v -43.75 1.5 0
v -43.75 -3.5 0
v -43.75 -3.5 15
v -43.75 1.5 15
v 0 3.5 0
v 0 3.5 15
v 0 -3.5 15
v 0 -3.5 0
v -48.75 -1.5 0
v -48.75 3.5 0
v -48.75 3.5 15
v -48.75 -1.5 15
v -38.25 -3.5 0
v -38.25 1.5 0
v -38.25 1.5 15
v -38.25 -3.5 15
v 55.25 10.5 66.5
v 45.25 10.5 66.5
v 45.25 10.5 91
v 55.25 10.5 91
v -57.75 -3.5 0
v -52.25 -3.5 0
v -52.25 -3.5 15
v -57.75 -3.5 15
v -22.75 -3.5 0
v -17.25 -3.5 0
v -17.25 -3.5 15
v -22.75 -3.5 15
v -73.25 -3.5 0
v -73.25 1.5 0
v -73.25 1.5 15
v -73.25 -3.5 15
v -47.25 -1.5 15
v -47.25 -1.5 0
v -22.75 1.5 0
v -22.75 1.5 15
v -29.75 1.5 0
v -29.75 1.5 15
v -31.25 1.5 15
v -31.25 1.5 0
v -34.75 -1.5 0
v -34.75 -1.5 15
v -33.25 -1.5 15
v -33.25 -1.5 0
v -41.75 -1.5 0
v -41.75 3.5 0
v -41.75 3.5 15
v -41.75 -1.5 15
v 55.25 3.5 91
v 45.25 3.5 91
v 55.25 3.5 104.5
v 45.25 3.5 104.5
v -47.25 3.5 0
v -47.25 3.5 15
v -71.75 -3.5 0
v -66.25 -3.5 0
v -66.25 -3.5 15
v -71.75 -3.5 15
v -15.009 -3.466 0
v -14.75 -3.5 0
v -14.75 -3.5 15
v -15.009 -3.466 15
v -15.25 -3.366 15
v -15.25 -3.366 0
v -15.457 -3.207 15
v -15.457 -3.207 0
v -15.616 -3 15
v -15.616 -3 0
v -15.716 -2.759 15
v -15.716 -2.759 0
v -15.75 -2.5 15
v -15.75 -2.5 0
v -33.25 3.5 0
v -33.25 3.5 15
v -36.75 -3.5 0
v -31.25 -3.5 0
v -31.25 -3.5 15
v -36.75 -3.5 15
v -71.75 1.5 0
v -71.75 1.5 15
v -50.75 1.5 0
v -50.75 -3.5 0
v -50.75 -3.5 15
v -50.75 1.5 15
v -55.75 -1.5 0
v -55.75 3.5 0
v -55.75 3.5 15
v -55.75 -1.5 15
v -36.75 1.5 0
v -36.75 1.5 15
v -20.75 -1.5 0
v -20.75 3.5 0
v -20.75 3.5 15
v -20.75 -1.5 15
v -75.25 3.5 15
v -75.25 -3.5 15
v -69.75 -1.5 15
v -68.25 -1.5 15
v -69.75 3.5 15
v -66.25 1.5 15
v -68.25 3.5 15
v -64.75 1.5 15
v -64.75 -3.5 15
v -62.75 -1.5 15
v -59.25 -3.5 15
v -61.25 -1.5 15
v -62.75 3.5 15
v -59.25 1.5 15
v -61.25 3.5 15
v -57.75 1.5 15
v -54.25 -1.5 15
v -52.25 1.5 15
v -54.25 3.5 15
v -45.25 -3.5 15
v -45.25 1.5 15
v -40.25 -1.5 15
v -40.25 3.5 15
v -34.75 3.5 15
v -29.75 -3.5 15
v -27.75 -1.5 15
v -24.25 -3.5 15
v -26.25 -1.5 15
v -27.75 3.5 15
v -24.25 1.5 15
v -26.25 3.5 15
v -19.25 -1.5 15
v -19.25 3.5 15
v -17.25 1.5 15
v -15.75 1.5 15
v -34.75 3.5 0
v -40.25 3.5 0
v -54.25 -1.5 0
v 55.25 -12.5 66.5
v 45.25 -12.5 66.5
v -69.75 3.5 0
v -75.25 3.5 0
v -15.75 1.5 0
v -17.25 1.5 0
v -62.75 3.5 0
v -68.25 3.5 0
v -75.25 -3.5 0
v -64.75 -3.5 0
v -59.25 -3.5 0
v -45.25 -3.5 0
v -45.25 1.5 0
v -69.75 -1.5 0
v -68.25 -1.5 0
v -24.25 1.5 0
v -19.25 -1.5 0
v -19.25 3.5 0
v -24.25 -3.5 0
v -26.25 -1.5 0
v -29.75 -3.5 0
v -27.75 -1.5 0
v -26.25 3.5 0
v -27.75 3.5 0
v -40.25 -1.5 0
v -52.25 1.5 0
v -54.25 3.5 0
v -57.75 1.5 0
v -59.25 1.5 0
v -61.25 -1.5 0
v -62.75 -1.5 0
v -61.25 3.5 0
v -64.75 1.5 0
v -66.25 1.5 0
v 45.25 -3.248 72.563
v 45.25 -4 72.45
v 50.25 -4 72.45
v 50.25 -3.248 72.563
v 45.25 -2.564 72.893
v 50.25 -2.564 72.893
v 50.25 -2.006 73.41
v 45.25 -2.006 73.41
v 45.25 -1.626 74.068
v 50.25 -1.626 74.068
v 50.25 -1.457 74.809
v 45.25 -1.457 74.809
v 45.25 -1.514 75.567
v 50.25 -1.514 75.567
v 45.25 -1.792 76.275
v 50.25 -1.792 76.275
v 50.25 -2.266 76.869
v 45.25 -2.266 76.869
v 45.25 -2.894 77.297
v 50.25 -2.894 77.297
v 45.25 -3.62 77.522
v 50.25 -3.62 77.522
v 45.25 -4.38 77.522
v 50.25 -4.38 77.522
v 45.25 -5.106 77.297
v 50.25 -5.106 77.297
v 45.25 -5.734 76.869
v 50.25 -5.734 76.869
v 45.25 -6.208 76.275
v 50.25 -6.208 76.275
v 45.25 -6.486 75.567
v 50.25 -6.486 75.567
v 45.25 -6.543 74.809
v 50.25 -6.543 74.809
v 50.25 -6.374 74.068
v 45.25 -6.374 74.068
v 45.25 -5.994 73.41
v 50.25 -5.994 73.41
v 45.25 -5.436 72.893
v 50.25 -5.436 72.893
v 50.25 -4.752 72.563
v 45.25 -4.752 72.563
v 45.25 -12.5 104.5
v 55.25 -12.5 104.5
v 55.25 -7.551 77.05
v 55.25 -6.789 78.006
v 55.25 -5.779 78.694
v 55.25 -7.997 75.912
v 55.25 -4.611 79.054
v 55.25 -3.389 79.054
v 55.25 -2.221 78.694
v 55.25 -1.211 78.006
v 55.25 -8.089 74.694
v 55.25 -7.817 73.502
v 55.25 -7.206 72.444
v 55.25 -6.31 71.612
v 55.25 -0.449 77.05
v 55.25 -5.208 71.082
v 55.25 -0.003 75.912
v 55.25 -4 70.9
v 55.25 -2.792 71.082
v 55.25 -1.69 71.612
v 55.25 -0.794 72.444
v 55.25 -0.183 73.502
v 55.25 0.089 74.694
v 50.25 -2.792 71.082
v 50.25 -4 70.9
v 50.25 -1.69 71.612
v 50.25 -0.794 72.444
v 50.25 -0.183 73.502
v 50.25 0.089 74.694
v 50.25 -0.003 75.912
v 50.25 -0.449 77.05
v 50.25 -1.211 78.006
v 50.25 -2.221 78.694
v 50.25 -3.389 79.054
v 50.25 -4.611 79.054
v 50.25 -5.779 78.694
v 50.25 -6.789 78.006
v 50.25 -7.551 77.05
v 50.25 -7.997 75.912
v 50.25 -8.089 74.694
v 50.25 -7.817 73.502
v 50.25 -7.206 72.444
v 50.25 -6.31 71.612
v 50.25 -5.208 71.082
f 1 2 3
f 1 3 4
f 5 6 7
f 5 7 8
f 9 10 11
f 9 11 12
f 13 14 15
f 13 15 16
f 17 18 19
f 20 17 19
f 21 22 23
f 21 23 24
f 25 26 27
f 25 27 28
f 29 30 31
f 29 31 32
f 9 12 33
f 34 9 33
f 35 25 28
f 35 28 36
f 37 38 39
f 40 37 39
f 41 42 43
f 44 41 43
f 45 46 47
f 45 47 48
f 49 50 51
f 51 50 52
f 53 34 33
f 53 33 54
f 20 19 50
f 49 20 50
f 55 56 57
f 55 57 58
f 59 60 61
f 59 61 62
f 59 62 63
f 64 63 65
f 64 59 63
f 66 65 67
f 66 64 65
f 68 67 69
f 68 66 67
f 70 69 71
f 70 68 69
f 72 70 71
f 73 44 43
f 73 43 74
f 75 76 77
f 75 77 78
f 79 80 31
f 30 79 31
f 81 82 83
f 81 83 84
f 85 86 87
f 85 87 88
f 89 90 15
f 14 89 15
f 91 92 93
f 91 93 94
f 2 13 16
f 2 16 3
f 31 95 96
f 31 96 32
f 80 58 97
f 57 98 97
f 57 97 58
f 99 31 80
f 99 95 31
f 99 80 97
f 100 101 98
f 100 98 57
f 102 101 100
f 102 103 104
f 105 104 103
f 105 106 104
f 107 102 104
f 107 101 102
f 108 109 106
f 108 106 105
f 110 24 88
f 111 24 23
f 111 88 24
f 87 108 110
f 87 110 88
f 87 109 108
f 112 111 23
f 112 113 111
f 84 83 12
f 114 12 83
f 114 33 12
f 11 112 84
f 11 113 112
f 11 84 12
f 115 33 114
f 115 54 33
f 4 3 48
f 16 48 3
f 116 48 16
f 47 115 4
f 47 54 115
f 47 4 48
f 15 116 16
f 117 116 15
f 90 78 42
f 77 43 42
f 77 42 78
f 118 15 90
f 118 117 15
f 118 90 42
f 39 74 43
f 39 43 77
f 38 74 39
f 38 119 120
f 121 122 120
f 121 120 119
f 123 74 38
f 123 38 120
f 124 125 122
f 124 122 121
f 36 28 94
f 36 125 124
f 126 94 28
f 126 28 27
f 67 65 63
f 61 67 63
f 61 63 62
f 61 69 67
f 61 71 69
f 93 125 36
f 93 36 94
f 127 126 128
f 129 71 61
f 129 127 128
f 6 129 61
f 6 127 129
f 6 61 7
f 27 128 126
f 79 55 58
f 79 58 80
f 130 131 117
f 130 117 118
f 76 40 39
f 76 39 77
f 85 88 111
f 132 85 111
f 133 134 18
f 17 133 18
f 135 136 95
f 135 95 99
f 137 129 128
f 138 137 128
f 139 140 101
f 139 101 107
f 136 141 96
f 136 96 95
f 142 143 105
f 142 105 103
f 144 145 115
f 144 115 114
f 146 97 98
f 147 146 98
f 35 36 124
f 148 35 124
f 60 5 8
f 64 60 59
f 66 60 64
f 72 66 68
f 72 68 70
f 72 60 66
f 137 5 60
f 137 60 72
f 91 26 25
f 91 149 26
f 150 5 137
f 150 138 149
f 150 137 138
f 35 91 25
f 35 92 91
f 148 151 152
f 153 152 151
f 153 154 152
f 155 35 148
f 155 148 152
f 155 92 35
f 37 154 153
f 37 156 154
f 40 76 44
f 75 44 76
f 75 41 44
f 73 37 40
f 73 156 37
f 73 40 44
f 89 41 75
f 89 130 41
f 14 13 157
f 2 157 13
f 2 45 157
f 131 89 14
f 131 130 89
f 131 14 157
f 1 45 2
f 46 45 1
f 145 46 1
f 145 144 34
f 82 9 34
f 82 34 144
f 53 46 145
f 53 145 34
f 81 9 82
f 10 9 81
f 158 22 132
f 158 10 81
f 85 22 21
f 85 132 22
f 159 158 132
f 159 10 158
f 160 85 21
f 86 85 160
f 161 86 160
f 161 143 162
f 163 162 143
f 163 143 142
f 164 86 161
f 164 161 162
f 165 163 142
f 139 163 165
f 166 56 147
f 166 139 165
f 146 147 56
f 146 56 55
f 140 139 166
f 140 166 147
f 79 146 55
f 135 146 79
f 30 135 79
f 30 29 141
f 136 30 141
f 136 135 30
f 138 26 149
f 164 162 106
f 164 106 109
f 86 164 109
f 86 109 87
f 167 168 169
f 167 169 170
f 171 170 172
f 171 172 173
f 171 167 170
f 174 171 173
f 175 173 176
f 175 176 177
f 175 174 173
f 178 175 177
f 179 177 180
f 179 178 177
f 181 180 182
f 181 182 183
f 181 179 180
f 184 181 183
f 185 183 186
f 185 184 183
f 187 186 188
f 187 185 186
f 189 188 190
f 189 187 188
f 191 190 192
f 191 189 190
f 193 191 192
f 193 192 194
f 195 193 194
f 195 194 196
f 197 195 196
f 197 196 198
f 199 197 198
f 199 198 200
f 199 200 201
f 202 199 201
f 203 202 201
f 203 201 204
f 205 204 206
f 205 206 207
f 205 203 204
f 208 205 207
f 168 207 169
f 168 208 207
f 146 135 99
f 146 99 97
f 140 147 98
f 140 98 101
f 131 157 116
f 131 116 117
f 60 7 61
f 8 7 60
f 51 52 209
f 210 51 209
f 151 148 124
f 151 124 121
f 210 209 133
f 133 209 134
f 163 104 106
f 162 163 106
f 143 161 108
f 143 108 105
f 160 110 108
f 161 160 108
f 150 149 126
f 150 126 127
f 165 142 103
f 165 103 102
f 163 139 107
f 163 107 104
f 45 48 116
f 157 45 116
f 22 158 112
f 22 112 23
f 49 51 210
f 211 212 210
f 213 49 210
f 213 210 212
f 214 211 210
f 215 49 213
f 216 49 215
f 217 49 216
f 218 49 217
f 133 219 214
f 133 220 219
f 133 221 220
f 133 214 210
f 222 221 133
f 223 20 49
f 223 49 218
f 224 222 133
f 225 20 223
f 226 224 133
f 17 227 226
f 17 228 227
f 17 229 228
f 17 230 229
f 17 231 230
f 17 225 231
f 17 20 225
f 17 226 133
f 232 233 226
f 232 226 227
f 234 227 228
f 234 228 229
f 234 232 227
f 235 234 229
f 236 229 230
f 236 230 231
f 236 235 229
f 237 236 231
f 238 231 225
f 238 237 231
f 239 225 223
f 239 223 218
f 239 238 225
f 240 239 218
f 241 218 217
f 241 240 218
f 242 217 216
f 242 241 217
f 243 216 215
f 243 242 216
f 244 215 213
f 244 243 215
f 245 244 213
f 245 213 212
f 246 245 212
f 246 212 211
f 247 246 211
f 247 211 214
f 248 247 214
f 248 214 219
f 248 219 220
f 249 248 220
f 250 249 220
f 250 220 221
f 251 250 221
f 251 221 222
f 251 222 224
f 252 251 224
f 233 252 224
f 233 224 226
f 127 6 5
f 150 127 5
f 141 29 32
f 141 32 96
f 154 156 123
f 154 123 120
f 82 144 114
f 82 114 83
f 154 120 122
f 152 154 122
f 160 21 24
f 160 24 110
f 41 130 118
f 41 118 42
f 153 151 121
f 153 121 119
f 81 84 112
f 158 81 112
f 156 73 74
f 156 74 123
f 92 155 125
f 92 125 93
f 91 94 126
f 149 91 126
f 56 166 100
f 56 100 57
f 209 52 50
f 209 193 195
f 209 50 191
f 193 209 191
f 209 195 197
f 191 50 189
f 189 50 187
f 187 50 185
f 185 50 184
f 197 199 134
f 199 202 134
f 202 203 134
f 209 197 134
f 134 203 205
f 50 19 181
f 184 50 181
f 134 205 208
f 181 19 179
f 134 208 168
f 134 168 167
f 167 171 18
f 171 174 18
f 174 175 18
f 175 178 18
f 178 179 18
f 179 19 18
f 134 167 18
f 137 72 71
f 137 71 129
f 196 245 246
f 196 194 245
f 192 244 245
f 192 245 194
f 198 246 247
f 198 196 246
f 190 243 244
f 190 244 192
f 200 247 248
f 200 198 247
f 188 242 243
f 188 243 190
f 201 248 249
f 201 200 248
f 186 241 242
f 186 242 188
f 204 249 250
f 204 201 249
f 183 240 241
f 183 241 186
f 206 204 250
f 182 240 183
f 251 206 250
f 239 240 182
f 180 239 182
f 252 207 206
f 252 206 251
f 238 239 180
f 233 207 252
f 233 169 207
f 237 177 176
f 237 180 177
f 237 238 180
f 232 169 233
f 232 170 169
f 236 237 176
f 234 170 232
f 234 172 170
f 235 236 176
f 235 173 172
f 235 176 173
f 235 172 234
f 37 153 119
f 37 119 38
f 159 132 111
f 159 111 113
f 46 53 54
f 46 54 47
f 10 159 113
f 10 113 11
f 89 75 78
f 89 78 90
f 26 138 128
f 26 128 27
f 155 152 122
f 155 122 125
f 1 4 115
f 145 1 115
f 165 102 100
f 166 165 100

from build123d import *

# Parameters (mm, degrees)
BOSS_EXTRUDE1_DEPTH = 62.5
SKETCH2_W           = 31.5
SKETCH2_H           = 7
BOSS_EXTRUDE2_DEPTH = 20
SKETCH3_W           = 15
SKETCH3_H           = 7
BOSS_EXTRUDE3_DEPTH = 19
SKETCH4_W           = 15
SKETCH4_H           = 15
BOSS_EXTRUDE4_DEPTH = 10
SKETCH5_R           = 3.71375
CUT_EXTRUDE1_DEPTH  = 7
FILLET1_R           = 1
FILLET2_R           = 1
SKETCH7_R           = 4.1
BOSS_EXTRUDE5_DEPTH = 10
SKETCH7_3_R         = 4.1
SKETCH7_3_R_2       = 2.55
BOSS_EXTRUDE6_DEPTH = 5
SKETCH8_W           = 8
SKETCH8_H           = 50
BOSS_EXTRUDE7_DEPTH = 7
SKETCH9_W           = 3
SKETCH9_H           = 40
CUT_EXTRUDE2_DEPTH  = 10
CUT_EXTRUDE3_DEPTH  = 134.333463542


with BuildPart() as part:
    # Sketch1 → Boss-Extrude1 (new body)
    with BuildSketch(Plane.XY):
        Polygon((13.75, -3.5), (-13.75, -3.5), (-15.75, -3.5), (-15.75, 1.5), (-17.25, 1.5), (-17.25, -3.5), (-22.75, -3.5), (-22.75, 1.5), (-24.25, 1.5), (-24.25, -3.5), (-29.75, -3.5), (-29.75, 1.5), (-31.25, 1.5), (-31.25, -3.5), (-36.75, -3.5), (-36.75, 1.5), (-38.25, 1.5), (-38.25, -3.5), (-43.75, -3.5), (-43.75, 1.5), (-45.25, 1.5), (-45.25, -3.5), (-50.75, -3.5), (-50.75, 1.5), (-52.25, 1.5), (-52.25, -3.5), (-57.75, -3.5), (-57.75, 1.5), (-59.25, 1.5), (-59.25, -3.5), (-64.75, -3.5), (-64.75, 1.5), (-66.25, 1.5), (-66.25, -3.5), (-71.75, -3.5), (-71.75, 1.5), (-73.25, 1.5), (-73.25, -3.5), (-75.25, -3.5), (-75.25, 3.5), (-69.75, 3.5), (-69.75, -1.5), (-68.25, -1.5), (-68.25, 3.5), (-62.75, 3.5), (-62.75, -1.5), (-61.25, -1.5), (-61.25, 3.5), (-55.75, 3.5), (-55.75, -1.5), (-54.25, -1.5), (-54.25, 3.5), (-48.75, 3.5), (-48.75, -1.5), (-47.25, -1.5), (-47.25, 3.5), (-41.75, 3.5), (-41.75, -1.5), (-40.25, -1.5), (-40.25, 3.5), (-34.75, 3.5), (-34.75, -1.5), (-33.25, -1.5), (-33.25, 3.5), (-27.75, 3.5), (-27.75, -1.5), (-26.25, -1.5), (-26.25, 3.5), (-20.75, 3.5), (-20.75, -1.5), (-19.25, -1.5), (-19.25, 3.5), (-13.75, 3.5), (13.75, 3.5), (19.25, 3.5), (19.25, -1.5), (20.75, -1.5), (20.75, 3.5), (26.25, 3.5), (26.25, -1.5), (27.75, -1.5), (27.75, 3.5), (33.25, 3.5), (33.25, -1.5), (34.75, -1.5), (34.75, 3.5), (40.25, 3.5), (40.25, -1.5), (41.75, -1.5), (41.75, 3.5), (47.25, 3.5), (47.25, -1.5), (48.75, -1.5), (48.75, 3.5), (54.25, 3.5), (54.25, -1.5), (55.75, -1.5), (55.75, 3.5), (61.25, 3.5), (61.25, -1.5), (62.75, -1.5), (62.75, 3.5), (68.25, 3.5), (68.25, -1.5), (69.75, -1.5), (69.75, 3.5), (75.25, 3.5), (75.25, -3.5), (73.25, -3.5), (73.25, 1.5), (71.75, 1.5), (71.75, -3.5), (66.25, -3.5), (66.25, 1.5), (64.75, 1.5), (64.75, -3.5), (59.25, -3.5), (59.25, 1.5), (57.75, 1.5), (57.75, -3.5), (52.25, -3.5), (52.25, 1.5), (50.75, 1.5), (50.75, -3.5), (45.25, -3.5), (45.25, 1.5), (43.75, 1.5), (43.75, -3.5), (38.25, -3.5), (38.25, 1.5), (36.75, 1.5), (36.75, -3.5), (31.25, -3.5), (31.25, 1.5), (29.75, 1.5), (29.75, -3.5), (24.25, -3.5), (24.25, 1.5), (22.75, 1.5), (22.75, -3.5), (17.25, -3.5), (17.25, 1.5), (15.75, 1.5), (15.75, -3.5), align=None)
    extrude(amount=BOSS_EXTRUDE1_DEPTH)

    # Sketch2 → Boss-Extrude2 (add)
    with BuildSketch(Plane.XY.offset(62.5)):
        Rectangle(SKETCH2_W, SKETCH2_H)
    extrude(amount=BOSS_EXTRUDE2_DEPTH)

    # Sketch3 → Boss-Extrude3 (add)
    with BuildSketch(Plane(origin=(15.75, 0, 0), x_dir=(0, 0, -1), z_dir=(1, 0, 0))):
        with Locations((-75, 0)):
            Rectangle(SKETCH3_W, SKETCH3_H)
    boss_extrude3 = extrude(amount=BOSS_EXTRUDE3_DEPTH)

    # Mirror1: Boss-Extrude3 across plane
    add(boss_extrude3.mirror(Plane(origin=(0, 0, 0), x_dir=(0, 0, 1), z_dir=(1, 0, 0))))

    # Sketch4 → Boss-Extrude4 (add)
    with BuildSketch(Plane(origin=(34.75, 0, 0), x_dir=(0, 0, -1), z_dir=(1, 0, 0))):
        with Locations((-75, -4)):
            Rectangle(SKETCH4_W, SKETCH4_H)
    boss_extrude4 = extrude(amount=BOSS_EXTRUDE4_DEPTH)

    # Mirror2: Boss-Extrude4 across plane
    add(boss_extrude4.mirror(Plane(origin=(0, 0, 0), x_dir=(0, 0, 1), z_dir=(1, 0, 0))))

    # Sketch5 → Cut-Extrude1 (cut)
    with BuildSketch(Plane(origin=(44.75, 0, 0), x_dir=(0, 0, -1), z_dir=(1, 0, 0))):
        with Locations((-75, -4)):
            Circle(SKETCH5_R)
    cut_extrude1 = extrude(amount=-CUT_EXTRUDE1_DEPTH, mode=Mode.SUBTRACT)

    # Mirror3: Cut-Extrude1 across plane
    add(cut_extrude1.mirror(Plane(origin=(0, 0, 0), x_dir=(0, 0, 1), z_dir=(1, 0, 0))), mode=Mode.SUBTRACT)

    # Fillet1
    fillet1_edges = [part.edges().sort_by_distance(p)[0] for p in [
        (-34.75, -7.5, 82.5),
        (-25.25, -3.5, 67.5),
        (0, -3.5, 82.5),
        (25.25, -3.5, 67.5),
        (34.75, -11.5, 75),
        (-34.75, -11.5, 75),
        (-34.75, -7.5, 67.5),
        (34.75, -7.5, 82.5),
        (34.75, -7.5, 67.5),
        (-44.75, 3.5, 75),
        (34.75, -3.5, 75),
        (-34.75, -3.5, 75),
        (44.75, -4, 82.5),
        (44.75, -11.5, 75),
        (44.75, 3.5, 75),
        (44.75, -4, 67.5),
        (39.75, -11.5, 67.5),
        (-39.75, -11.5, 67.5),
        (-44.75, -11.5, 75),
        (-44.75, -4, 67.5),
        (-44.75, -4, 82.5),
        (0, 3.5, 82.5),
    ]]
    fillet(fillet1_edges, radius=FILLET1_R)

    # Fillet2
    fillet2_edges = [part.edges().sort_by_distance(p)[0] for p in [
        (15.75, -3.5, 34.25),
        (-15.75, -3.5, 34.25),
    ]]
    fillet(fillet2_edges, radius=FILLET2_R)

    # Sketch8 → Boss-Extrude7 (add)
    with BuildSketch(Plane(origin=(0, 3.5, 0), x_dir=(1, 0, 0), z_dir=(0, 1, 0))):
        with Locations((77.25, -31.25)):
            Rectangle(SKETCH8_W, SKETCH8_H)
    extrude(amount=-BOSS_EXTRUDE7_DEPTH)

    # Sketch9 → Cut-Extrude2 (cut)
    with BuildSketch(Plane(origin=(0, 3.5, 0), x_dir=(1, 0, 0), z_dir=(0, 1, 0))):
        with Locations((77.25, -31.25)):
            Rectangle(SKETCH9_W, SKETCH9_H)
    extrude(amount=-CUT_EXTRUDE2_DEPTH, mode=Mode.SUBTRACT)

    # Sketch10 → Cut-Extrude3 (cut, through all)
    with BuildSketch(Plane(origin=(0, 3.5, 0), x_dir=(1, 0, 0), z_dir=(0, 1, 0))):
        Polygon((0, 0), (86.365697076, 0), (86.365697076, -92.937569977), (-81.175072776, -92.937569977), (-81.175072776, -15), (0, -15), align=None)
    extrude(amount=-CUT_EXTRUDE3_DEPTH, mode=Mode.SUBTRACT)


with BuildPart() as body_2:
    # Sketch7 → Boss-Extrude5 (new body)
    with BuildSketch(Plane(origin=(45.25, 0, 0), x_dir=(0, 0, -1), z_dir=(1, 0, 0))):
        Polygon((-91, -12.5), (-66.5, -12.5), (-66.5, 10.5), (-91, 10.5), (-91, 3.5), (-104.5, 3.5), (-104.5, -12.5), align=None)
        with Locations((-75, -4)):
            Circle(SKETCH7_R, mode=Mode.SUBTRACT)
    extrude(amount=BOSS_EXTRUDE5_DEPTH)

    # Sketch7<3> → Boss-Extrude6 (add)
    with BuildSketch(Plane(origin=(45.25, 0, 0), x_dir=(0, 0, -1), z_dir=(1, 0, 0))):
        with Locations((-75, -4)):
            Circle(SKETCH7_3_R)
        with Locations((-75, -4)):
            Circle(SKETCH7_3_R_2, mode=Mode.SUBTRACT)
    extrude(amount=BOSS_EXTRUDE6_DEPTH)


solid = Compound([part.part, body_2.part])
